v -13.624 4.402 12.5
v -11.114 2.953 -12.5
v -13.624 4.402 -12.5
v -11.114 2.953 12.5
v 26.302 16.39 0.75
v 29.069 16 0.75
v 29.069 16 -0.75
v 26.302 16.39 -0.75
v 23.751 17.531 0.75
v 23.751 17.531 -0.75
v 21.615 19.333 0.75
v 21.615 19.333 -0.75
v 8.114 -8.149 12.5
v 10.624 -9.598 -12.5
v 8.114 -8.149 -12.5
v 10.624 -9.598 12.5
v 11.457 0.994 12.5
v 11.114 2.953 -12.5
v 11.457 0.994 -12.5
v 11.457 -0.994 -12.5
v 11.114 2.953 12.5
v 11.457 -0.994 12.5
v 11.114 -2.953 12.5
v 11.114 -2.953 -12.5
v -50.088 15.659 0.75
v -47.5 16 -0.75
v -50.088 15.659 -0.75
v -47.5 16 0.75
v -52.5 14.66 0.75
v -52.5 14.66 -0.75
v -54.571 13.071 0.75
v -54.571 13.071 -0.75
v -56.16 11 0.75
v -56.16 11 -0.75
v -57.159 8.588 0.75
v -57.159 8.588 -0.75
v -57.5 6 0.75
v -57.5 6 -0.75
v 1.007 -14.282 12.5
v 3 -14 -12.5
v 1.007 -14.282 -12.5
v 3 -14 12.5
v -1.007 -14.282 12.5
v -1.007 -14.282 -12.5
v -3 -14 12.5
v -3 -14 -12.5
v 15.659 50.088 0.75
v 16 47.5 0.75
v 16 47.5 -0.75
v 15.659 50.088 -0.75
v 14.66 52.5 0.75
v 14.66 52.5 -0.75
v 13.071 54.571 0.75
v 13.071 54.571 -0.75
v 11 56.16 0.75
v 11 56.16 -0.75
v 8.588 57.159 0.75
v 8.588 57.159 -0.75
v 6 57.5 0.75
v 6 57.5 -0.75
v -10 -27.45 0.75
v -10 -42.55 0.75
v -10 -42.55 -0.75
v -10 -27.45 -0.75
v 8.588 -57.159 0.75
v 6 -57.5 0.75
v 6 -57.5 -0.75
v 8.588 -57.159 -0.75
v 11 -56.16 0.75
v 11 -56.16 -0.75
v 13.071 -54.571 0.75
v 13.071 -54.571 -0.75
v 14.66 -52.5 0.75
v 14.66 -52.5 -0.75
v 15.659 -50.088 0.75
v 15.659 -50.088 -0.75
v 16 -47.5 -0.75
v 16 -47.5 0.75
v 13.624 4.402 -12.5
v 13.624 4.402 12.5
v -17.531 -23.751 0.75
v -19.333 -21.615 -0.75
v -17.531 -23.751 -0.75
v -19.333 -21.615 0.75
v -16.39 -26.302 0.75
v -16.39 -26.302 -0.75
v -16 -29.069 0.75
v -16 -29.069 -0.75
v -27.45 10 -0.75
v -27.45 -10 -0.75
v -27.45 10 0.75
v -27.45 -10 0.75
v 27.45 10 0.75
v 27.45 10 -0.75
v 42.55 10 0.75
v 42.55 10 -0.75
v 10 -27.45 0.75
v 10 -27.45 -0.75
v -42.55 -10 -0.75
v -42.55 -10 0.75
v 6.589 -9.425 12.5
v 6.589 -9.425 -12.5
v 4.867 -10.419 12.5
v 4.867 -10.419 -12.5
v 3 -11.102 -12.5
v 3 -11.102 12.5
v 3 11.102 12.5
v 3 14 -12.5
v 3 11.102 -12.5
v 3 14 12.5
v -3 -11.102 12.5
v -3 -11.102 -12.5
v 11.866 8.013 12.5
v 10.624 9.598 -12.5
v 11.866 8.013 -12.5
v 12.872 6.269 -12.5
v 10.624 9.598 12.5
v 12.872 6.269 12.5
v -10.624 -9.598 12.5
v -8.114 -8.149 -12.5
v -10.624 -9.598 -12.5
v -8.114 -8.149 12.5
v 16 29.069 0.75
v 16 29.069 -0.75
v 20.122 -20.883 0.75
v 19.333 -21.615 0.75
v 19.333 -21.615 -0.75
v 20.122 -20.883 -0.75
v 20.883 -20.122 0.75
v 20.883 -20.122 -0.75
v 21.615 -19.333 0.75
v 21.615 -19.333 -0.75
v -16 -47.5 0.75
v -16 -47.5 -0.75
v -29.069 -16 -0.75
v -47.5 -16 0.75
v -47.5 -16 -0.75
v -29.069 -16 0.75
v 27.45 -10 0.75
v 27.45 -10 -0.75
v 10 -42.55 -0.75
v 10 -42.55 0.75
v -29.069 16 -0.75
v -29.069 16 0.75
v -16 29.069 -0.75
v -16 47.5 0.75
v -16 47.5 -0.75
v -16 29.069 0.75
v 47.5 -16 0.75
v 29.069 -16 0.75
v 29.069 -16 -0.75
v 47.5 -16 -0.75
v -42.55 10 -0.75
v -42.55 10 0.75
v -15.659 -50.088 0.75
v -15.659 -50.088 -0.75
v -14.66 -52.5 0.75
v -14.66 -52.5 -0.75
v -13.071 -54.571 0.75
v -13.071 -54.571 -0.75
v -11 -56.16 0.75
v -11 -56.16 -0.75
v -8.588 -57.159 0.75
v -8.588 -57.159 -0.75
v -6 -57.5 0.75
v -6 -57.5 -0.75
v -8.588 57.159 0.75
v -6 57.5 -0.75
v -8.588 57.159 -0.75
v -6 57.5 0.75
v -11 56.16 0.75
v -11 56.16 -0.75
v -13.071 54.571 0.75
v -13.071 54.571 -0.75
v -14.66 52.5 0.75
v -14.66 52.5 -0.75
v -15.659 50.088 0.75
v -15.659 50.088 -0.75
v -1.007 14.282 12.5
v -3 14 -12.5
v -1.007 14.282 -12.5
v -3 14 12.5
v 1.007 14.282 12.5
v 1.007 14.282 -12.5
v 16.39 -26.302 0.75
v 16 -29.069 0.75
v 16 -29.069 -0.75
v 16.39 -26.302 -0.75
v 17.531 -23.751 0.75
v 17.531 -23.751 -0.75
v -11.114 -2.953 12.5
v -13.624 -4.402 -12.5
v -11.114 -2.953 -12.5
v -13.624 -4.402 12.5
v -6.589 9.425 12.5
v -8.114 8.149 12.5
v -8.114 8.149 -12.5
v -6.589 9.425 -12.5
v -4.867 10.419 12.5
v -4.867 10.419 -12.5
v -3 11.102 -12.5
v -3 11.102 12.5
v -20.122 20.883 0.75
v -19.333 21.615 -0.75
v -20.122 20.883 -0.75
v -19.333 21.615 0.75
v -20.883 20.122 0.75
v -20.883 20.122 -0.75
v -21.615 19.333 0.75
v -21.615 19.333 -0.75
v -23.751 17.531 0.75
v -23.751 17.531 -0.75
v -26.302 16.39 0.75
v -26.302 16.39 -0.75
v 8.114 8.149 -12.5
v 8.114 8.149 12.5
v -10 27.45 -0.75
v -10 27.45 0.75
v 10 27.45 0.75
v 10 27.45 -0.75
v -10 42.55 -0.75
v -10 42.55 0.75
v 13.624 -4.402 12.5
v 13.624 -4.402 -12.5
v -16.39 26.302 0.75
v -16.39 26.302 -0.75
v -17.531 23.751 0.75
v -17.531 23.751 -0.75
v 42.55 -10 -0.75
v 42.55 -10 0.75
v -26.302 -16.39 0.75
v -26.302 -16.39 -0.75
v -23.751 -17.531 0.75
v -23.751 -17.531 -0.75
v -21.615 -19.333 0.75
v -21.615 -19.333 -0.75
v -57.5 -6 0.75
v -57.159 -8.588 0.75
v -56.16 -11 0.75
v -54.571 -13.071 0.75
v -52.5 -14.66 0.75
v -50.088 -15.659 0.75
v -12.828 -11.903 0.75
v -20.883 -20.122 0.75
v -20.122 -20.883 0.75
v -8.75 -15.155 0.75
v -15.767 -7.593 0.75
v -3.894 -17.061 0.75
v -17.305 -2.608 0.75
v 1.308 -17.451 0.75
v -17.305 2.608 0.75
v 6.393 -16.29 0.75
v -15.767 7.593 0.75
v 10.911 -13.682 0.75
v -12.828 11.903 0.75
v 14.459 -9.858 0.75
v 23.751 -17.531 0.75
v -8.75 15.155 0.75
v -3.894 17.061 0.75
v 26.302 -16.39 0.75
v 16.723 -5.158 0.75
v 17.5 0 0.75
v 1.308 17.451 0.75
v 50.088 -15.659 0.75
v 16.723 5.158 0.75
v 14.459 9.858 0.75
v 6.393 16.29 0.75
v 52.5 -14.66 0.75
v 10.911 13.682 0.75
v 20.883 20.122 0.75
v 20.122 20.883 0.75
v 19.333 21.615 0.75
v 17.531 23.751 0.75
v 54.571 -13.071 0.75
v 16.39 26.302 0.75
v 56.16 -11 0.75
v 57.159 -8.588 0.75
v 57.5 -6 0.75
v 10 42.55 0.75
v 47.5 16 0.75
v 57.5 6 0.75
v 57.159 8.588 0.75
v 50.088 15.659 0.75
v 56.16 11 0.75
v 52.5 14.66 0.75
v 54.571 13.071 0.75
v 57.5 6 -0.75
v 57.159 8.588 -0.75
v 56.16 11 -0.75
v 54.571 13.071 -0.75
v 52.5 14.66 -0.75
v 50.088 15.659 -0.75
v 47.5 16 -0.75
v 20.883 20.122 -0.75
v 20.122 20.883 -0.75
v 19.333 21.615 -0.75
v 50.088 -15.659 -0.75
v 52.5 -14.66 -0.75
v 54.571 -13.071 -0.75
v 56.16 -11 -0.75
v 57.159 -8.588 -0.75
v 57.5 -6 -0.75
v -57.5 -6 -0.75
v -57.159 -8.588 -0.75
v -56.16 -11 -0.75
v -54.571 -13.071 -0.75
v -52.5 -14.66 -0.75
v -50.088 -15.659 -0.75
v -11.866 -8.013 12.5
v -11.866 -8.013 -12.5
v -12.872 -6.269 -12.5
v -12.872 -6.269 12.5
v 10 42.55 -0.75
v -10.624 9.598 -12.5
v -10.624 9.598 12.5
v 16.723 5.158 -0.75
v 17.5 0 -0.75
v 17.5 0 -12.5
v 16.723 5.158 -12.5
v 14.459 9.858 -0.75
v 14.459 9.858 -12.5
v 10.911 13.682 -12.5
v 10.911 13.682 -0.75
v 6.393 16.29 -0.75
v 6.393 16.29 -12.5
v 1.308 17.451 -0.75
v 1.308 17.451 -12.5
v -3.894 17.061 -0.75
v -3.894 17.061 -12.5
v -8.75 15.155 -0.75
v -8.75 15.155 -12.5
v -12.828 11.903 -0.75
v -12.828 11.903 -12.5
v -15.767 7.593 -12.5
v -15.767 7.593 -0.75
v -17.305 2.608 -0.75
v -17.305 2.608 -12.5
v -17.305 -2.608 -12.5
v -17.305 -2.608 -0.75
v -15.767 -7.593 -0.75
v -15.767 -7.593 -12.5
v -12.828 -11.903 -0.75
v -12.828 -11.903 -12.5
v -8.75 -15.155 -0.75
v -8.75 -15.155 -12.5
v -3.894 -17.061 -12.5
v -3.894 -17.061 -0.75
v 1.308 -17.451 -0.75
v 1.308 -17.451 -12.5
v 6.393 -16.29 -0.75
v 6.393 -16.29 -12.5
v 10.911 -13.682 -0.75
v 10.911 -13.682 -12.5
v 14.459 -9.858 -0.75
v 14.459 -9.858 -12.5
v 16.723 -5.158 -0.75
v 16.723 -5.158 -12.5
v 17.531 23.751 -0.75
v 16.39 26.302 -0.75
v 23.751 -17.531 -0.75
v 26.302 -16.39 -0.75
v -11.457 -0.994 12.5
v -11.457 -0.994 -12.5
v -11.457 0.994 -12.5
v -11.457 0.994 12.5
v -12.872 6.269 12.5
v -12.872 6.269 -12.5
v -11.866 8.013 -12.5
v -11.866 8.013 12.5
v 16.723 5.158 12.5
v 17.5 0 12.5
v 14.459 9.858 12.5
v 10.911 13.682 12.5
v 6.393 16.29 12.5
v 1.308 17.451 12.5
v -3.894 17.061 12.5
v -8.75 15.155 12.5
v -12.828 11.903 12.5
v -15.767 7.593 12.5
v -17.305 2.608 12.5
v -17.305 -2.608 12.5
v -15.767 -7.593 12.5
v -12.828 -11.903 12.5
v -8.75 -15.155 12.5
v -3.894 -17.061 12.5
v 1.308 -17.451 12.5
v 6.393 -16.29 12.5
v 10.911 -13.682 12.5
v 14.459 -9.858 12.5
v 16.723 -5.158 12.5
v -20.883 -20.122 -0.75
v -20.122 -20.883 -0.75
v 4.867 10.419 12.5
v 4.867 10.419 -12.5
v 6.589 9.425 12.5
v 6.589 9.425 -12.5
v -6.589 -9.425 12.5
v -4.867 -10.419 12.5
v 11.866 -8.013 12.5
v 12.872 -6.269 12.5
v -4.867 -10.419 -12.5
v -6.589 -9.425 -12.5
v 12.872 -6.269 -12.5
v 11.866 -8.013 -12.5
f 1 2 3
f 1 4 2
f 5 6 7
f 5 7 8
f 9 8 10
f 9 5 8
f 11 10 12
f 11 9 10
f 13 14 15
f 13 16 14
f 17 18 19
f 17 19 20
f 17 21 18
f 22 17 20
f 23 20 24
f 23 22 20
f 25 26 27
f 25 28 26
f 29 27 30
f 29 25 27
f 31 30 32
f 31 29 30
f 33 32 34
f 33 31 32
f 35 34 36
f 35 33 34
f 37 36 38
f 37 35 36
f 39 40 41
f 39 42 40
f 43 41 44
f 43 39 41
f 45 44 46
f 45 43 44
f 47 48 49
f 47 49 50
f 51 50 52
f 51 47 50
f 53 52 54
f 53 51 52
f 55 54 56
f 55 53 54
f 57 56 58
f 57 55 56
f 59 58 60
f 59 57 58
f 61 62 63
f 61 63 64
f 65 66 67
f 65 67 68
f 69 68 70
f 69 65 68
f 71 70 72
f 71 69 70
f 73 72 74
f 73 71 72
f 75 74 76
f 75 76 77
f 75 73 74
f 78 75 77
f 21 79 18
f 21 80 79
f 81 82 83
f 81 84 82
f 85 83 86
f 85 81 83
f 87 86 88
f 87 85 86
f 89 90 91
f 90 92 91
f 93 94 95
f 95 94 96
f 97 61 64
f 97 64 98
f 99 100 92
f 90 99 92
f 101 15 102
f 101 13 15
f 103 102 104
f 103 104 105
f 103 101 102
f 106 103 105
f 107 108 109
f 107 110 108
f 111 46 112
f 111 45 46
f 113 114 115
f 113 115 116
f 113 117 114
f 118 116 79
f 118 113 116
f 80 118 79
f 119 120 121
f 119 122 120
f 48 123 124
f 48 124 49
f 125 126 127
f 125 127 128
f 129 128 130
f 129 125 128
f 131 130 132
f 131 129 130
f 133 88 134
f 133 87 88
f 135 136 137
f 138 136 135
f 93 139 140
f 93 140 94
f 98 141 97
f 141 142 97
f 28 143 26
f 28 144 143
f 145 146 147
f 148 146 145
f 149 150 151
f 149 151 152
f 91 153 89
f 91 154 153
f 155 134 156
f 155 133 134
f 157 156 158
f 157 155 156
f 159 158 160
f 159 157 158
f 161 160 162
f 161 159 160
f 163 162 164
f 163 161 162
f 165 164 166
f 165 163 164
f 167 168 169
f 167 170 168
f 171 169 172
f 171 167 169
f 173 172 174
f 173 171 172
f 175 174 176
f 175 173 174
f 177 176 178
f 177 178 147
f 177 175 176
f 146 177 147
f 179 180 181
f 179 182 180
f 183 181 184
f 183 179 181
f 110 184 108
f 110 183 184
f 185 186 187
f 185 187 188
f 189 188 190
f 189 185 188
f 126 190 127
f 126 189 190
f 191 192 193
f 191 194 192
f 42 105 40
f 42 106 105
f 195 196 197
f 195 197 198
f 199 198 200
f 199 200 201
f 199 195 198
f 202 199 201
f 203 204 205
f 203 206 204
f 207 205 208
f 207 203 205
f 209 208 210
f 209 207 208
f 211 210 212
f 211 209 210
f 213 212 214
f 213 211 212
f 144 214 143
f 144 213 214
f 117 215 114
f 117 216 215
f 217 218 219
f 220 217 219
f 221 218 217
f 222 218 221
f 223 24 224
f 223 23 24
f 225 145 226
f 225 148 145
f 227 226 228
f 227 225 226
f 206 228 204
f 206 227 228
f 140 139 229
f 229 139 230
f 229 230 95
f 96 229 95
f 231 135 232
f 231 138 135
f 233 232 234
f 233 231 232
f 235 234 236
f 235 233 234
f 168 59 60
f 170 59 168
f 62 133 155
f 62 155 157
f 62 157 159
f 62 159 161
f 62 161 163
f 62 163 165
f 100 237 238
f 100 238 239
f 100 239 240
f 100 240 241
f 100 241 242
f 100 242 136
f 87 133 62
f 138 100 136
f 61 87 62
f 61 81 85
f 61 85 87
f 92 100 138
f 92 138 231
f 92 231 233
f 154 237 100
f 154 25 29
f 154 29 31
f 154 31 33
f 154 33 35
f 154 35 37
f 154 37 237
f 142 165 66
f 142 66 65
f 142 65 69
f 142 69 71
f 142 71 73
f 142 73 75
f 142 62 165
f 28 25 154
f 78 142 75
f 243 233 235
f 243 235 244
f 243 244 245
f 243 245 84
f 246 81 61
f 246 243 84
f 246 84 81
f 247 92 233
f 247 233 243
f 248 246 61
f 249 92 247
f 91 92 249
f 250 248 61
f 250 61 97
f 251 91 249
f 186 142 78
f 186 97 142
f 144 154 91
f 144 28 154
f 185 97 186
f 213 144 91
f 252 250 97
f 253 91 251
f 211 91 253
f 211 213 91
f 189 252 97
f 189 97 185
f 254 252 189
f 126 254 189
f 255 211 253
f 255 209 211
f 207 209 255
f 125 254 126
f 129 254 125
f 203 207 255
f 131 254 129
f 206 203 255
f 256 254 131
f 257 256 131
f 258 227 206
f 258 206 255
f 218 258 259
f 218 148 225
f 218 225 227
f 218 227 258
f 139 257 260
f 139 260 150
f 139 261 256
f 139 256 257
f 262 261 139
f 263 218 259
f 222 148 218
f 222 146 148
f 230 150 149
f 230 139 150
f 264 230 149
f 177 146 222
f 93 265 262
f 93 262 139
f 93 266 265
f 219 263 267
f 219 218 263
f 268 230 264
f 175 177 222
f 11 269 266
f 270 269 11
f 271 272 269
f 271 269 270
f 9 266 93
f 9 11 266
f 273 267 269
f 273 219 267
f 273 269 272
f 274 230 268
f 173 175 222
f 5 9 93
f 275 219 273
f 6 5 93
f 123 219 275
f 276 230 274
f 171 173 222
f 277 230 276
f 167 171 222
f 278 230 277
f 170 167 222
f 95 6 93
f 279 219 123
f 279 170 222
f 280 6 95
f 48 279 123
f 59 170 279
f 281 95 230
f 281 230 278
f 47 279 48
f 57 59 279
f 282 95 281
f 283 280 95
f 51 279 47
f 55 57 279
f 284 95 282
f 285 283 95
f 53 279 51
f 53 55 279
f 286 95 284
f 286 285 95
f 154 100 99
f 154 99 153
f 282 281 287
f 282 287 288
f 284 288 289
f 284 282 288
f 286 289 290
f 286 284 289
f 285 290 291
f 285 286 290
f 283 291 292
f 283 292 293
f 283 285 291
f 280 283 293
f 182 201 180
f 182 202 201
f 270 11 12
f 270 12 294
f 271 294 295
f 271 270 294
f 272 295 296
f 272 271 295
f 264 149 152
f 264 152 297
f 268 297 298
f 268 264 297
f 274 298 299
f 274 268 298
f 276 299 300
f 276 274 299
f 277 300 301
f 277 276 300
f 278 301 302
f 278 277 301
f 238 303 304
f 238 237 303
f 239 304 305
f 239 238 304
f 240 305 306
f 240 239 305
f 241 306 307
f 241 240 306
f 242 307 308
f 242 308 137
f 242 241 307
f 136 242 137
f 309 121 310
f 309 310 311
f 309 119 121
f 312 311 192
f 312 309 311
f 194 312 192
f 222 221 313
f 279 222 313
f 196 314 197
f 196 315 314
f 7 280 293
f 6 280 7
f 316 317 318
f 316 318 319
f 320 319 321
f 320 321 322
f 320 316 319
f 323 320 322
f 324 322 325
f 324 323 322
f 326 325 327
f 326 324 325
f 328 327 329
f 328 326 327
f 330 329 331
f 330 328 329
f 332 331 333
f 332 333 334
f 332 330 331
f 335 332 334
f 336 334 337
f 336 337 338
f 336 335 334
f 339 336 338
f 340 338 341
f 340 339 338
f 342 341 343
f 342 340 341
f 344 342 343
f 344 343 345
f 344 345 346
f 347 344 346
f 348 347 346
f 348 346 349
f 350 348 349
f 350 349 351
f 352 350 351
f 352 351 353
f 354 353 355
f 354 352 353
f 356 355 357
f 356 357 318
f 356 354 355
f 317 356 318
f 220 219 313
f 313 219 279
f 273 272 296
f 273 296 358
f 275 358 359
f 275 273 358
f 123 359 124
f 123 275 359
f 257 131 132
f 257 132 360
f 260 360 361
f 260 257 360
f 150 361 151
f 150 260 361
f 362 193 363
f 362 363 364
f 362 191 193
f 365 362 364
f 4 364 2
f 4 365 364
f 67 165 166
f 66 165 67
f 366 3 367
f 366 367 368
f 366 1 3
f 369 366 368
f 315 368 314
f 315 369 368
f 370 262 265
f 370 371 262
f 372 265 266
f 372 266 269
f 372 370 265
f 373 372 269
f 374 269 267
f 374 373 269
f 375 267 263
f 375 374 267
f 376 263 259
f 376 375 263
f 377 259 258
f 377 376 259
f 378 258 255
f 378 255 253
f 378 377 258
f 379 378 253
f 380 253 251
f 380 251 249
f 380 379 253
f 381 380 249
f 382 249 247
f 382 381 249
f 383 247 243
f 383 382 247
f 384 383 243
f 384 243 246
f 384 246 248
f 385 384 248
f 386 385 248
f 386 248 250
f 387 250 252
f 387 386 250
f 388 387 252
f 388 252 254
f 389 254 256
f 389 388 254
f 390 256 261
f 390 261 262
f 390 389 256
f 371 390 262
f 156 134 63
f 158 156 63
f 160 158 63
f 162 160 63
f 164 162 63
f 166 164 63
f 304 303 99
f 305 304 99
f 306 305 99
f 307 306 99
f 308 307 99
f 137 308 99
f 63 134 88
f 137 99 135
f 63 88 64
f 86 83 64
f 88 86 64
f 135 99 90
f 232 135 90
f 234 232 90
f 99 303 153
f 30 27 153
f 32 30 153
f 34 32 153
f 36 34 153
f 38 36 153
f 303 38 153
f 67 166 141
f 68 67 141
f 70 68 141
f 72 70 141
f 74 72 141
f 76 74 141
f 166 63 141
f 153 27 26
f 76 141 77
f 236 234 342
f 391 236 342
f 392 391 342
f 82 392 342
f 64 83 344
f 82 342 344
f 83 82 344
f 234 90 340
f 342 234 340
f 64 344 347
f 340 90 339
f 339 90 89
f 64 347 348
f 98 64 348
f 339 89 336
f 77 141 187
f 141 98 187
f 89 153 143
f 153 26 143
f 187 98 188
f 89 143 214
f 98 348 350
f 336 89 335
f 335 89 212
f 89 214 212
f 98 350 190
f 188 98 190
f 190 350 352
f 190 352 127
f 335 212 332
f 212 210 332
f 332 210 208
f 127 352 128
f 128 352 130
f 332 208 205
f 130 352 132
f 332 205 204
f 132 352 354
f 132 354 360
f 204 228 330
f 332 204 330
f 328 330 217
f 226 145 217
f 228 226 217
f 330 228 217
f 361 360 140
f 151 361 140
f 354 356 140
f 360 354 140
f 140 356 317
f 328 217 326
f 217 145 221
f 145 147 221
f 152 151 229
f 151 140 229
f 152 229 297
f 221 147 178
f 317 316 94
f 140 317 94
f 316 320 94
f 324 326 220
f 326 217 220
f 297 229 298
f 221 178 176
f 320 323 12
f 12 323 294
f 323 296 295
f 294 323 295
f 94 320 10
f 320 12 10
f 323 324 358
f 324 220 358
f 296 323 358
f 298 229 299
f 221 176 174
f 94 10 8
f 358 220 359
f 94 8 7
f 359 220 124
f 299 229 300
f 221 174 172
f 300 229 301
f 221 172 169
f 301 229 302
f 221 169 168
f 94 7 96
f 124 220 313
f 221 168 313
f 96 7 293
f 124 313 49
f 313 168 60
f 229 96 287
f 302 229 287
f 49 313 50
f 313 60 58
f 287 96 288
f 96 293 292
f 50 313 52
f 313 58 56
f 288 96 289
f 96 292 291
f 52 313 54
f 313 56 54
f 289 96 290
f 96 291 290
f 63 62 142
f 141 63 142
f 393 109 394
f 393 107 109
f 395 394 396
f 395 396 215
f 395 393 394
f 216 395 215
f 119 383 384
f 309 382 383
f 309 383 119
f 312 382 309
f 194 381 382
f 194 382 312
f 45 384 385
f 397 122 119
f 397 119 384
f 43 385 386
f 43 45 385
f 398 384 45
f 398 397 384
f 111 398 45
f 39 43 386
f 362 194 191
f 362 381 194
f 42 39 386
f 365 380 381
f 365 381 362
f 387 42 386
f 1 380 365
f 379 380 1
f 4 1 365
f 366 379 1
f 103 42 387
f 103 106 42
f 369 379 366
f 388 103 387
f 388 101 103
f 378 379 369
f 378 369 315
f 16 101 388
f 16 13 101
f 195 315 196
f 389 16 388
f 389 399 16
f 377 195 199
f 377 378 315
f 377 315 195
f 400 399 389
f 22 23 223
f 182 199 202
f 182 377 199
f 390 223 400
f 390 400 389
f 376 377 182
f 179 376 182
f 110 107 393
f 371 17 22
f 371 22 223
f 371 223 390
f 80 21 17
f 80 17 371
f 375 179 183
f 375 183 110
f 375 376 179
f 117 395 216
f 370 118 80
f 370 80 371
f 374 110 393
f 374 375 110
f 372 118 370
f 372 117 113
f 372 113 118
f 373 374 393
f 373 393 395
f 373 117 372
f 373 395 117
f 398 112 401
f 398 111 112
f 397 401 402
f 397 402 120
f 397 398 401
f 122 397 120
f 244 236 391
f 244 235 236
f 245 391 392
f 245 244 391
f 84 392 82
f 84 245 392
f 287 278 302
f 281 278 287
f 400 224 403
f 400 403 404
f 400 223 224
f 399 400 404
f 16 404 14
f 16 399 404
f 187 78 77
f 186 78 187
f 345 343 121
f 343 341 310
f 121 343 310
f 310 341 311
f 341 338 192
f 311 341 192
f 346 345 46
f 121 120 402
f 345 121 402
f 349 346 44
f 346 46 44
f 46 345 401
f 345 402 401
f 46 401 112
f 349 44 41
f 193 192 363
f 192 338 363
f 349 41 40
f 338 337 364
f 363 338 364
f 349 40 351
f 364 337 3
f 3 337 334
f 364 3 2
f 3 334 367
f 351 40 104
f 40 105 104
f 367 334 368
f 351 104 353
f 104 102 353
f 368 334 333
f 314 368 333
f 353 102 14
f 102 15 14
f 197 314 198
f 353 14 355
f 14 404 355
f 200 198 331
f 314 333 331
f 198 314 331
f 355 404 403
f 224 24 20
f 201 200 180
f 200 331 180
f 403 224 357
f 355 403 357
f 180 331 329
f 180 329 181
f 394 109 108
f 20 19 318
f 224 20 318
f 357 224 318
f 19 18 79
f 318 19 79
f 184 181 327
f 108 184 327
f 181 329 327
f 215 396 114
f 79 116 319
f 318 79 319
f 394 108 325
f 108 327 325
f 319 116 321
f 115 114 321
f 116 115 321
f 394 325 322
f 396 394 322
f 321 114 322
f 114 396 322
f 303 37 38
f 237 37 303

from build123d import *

# Parameters (mm, degrees)
SKETCH1_R           = 17.5
SKETCH1_W           = 20
SKETCH1_H           = 15.1
SKETCH1_W_2         = 15.1
SKETCH1_H_2         = 20
BOSS_EXTRUDE1_DEPTH = 0.75
SKETCH1_3_R         = 17.5
BOSS_EXTRUDE2_DEPTH = 12.5


with BuildPart() as part:
    # Sketch1 → Boss-Extrude1 (new, symmetric)
    with BuildSketch(Plane.XY):
        with BuildLine():
            Line((-6, -57.5), (6, -57.5))
            ThreePointArc((6, -57.5), (13.071067812, -54.571067812), (16, -47.5))
            Line((16, -47.5), (16, -29.068883707))
            ThreePointArc((16, -29.068883707), (16.871290708, -24.986400803), (19.333333333, -21.615323782))
            ThreePointArc((19.333333333, -21.615323782), (20.506096654, -20.506096654), (21.615323782, -19.333333333))
            ThreePointArc((21.615323782, -19.333333333), (24.986400803, -16.871290708), (29.068883707, -16))
            Line((29.068883707, -16), (47.5, -16))
            ThreePointArc((47.5, -16), (54.571067812, -13.071067812), (57.5, -6))
            Line((57.5, -6), (57.5, 6))
            ThreePointArc((57.5, 6), (54.571067812, 13.071067812), (47.5, 16))
            Line((47.5, 16), (29.068883707, 16))
            ThreePointArc((29.068883707, 16), (24.986400803, 16.871290708), (21.615323782, 19.333333333))
            ThreePointArc((21.615323782, 19.333333333), (20.506096654, 20.506096654), (19.333333333, 21.615323782))
            ThreePointArc((19.333333333, 21.615323782), (16.871290708, 24.986400803), (16, 29.068883707))
            Line((16, 29.068883707), (16, 47.5))
            ThreePointArc((16, 47.5), (13.071067812, 54.571067812), (6, 57.5))
            Line((6, 57.5), (-6, 57.5))
            ThreePointArc((-6, 57.5), (-13.071067812, 54.571067812), (-16, 47.5))
            Line((-16, 47.5), (-16, 29.068883707))
            ThreePointArc((-16, 29.068883707), (-16.871290708, 24.986400803), (-19.333333333, 21.615323782))
            ThreePointArc((-19.333333333, 21.615323782), (-20.506096654, 20.506096654), (-21.615323782, 19.333333333))
            ThreePointArc((-21.615323782, 19.333333333), (-24.986400803, 16.871290708), (-29.068883707, 16))
            Line((-29.068883707, 16), (-47.5, 16))
            ThreePointArc((-47.5, 16), (-54.571067812, 13.071067812), (-57.5, 6))
            Line((-57.5, 6), (-57.5, -6))
            ThreePointArc((-57.5, -6), (-54.571067812, -13.071067812), (-47.5, -16))
            Line((-47.5, -16), (-29.068883707, -16))
            ThreePointArc((-29.068883707, -16), (-24.986400803, -16.871290708), (-21.615323782, -19.333333333))
            ThreePointArc((-21.615323782, -19.333333333), (-20.506096654, -20.506096654), (-19.333333333, -21.615323782))
            ThreePointArc((-19.333333333, -21.615323782), (-16.871290708, -24.986400803), (-16, -29.068883707))
            Line((-16, -29.068883707), (-16, -47.5))
            ThreePointArc((-16, -47.5), (-13.071067812, -54.571067812), (-6, -57.5))
        make_face()
        Circle(SKETCH1_R, mode=Mode.SUBTRACT)
        with Locations((0, 35)):
            Rectangle(SKETCH1_W, SKETCH1_H, mode=Mode.SUBTRACT)
        with Locations((0, -35)):
            Rectangle(SKETCH1_W, SKETCH1_H, mode=Mode.SUBTRACT)
        with Locations((35, 0)):
            Rectangle(SKETCH1_W_2, SKETCH1_H_2, mode=Mode.SUBTRACT)
        with Locations((-35, 0)):
            Rectangle(SKETCH1_W_2, SKETCH1_H_2, mode=Mode.SUBTRACT)
    extrude(amount=BOSS_EXTRUDE1_DEPTH, both=True)

    # Sketch1<3> → Boss-Extrude2 (add, symmetric)
    with BuildSketch(Plane.XY):
        Circle(SKETCH1_3_R)
        with BuildLine():
            ThreePointArc((-8.114442262, 8.148977039), (-5.75, 9.959292144), (-3, 11.101801656))
            Line((-3, 11.101801656), (-3, 14))
            ThreePointArc((-3, 14), (0, 14.317821063), (3, 14))
            Line((3, 14), (3, 11.101801656))
            ThreePointArc((3, 11.101801656), (5.75, 9.959292144), (8.114442262, 8.148977039))
            Line((8.114442262, 8.148977039), (10.624355653, 9.598076211))
            ThreePointArc((10.624355653, 9.598076211), (12.399596768, 7.158910532), (13.624355653, 4.401923789))
            Line((13.624355653, 4.401923789), (11.114442262, 2.952824616))
            ThreePointArc((11.114442262, 2.952824616), (11.5, 0), (11.114442262, -2.952824616))
            Line((11.114442262, -2.952824616), (13.624355653, -4.401923789))
            ThreePointArc((13.624355653, -4.401923789), (12.399596768, -7.158910532), (10.624355653, -9.598076211))
            Line((10.624355653, -9.598076211), (8.114442262, -8.148977039))
            ThreePointArc((8.114442262, -8.148977039), (5.75, -9.959292144), (3, -11.101801656))
            Line((3, -11.101801656), (3, -14))
            ThreePointArc((3, -14), (0, -14.317821063), (-3, -14))
            Line((-3, -14), (-3, -11.101801656))
            ThreePointArc((-3, -11.101801656), (-5.75, -9.959292144), (-8.114442262, -8.148977039))
            Line((-8.114442262, -8.148977039), (-10.624355653, -9.598076211))
            ThreePointArc((-10.624355653, -9.598076211), (-12.399596768, -7.158910532), (-13.624355653, -4.401923789))
            Line((-13.624355653, -4.401923789), (-11.114442262, -2.952824616))
            ThreePointArc((-11.114442262, -2.952824616), (-11.5, 0), (-11.114442262, 2.952824616))
            Line((-11.114442262, 2.952824616), (-13.624355653, 4.401923789))
            ThreePointArc((-13.624355653, 4.401923789), (-12.399596768, 7.158910532), (-10.624355653, 9.598076211))
            Line((-10.624355653, 9.598076211), (-8.114442262, 8.148977039))
        make_face(mode=Mode.SUBTRACT)
    extrude(amount=BOSS_EXTRUDE2_DEPTH, both=True)


solid = part.part
